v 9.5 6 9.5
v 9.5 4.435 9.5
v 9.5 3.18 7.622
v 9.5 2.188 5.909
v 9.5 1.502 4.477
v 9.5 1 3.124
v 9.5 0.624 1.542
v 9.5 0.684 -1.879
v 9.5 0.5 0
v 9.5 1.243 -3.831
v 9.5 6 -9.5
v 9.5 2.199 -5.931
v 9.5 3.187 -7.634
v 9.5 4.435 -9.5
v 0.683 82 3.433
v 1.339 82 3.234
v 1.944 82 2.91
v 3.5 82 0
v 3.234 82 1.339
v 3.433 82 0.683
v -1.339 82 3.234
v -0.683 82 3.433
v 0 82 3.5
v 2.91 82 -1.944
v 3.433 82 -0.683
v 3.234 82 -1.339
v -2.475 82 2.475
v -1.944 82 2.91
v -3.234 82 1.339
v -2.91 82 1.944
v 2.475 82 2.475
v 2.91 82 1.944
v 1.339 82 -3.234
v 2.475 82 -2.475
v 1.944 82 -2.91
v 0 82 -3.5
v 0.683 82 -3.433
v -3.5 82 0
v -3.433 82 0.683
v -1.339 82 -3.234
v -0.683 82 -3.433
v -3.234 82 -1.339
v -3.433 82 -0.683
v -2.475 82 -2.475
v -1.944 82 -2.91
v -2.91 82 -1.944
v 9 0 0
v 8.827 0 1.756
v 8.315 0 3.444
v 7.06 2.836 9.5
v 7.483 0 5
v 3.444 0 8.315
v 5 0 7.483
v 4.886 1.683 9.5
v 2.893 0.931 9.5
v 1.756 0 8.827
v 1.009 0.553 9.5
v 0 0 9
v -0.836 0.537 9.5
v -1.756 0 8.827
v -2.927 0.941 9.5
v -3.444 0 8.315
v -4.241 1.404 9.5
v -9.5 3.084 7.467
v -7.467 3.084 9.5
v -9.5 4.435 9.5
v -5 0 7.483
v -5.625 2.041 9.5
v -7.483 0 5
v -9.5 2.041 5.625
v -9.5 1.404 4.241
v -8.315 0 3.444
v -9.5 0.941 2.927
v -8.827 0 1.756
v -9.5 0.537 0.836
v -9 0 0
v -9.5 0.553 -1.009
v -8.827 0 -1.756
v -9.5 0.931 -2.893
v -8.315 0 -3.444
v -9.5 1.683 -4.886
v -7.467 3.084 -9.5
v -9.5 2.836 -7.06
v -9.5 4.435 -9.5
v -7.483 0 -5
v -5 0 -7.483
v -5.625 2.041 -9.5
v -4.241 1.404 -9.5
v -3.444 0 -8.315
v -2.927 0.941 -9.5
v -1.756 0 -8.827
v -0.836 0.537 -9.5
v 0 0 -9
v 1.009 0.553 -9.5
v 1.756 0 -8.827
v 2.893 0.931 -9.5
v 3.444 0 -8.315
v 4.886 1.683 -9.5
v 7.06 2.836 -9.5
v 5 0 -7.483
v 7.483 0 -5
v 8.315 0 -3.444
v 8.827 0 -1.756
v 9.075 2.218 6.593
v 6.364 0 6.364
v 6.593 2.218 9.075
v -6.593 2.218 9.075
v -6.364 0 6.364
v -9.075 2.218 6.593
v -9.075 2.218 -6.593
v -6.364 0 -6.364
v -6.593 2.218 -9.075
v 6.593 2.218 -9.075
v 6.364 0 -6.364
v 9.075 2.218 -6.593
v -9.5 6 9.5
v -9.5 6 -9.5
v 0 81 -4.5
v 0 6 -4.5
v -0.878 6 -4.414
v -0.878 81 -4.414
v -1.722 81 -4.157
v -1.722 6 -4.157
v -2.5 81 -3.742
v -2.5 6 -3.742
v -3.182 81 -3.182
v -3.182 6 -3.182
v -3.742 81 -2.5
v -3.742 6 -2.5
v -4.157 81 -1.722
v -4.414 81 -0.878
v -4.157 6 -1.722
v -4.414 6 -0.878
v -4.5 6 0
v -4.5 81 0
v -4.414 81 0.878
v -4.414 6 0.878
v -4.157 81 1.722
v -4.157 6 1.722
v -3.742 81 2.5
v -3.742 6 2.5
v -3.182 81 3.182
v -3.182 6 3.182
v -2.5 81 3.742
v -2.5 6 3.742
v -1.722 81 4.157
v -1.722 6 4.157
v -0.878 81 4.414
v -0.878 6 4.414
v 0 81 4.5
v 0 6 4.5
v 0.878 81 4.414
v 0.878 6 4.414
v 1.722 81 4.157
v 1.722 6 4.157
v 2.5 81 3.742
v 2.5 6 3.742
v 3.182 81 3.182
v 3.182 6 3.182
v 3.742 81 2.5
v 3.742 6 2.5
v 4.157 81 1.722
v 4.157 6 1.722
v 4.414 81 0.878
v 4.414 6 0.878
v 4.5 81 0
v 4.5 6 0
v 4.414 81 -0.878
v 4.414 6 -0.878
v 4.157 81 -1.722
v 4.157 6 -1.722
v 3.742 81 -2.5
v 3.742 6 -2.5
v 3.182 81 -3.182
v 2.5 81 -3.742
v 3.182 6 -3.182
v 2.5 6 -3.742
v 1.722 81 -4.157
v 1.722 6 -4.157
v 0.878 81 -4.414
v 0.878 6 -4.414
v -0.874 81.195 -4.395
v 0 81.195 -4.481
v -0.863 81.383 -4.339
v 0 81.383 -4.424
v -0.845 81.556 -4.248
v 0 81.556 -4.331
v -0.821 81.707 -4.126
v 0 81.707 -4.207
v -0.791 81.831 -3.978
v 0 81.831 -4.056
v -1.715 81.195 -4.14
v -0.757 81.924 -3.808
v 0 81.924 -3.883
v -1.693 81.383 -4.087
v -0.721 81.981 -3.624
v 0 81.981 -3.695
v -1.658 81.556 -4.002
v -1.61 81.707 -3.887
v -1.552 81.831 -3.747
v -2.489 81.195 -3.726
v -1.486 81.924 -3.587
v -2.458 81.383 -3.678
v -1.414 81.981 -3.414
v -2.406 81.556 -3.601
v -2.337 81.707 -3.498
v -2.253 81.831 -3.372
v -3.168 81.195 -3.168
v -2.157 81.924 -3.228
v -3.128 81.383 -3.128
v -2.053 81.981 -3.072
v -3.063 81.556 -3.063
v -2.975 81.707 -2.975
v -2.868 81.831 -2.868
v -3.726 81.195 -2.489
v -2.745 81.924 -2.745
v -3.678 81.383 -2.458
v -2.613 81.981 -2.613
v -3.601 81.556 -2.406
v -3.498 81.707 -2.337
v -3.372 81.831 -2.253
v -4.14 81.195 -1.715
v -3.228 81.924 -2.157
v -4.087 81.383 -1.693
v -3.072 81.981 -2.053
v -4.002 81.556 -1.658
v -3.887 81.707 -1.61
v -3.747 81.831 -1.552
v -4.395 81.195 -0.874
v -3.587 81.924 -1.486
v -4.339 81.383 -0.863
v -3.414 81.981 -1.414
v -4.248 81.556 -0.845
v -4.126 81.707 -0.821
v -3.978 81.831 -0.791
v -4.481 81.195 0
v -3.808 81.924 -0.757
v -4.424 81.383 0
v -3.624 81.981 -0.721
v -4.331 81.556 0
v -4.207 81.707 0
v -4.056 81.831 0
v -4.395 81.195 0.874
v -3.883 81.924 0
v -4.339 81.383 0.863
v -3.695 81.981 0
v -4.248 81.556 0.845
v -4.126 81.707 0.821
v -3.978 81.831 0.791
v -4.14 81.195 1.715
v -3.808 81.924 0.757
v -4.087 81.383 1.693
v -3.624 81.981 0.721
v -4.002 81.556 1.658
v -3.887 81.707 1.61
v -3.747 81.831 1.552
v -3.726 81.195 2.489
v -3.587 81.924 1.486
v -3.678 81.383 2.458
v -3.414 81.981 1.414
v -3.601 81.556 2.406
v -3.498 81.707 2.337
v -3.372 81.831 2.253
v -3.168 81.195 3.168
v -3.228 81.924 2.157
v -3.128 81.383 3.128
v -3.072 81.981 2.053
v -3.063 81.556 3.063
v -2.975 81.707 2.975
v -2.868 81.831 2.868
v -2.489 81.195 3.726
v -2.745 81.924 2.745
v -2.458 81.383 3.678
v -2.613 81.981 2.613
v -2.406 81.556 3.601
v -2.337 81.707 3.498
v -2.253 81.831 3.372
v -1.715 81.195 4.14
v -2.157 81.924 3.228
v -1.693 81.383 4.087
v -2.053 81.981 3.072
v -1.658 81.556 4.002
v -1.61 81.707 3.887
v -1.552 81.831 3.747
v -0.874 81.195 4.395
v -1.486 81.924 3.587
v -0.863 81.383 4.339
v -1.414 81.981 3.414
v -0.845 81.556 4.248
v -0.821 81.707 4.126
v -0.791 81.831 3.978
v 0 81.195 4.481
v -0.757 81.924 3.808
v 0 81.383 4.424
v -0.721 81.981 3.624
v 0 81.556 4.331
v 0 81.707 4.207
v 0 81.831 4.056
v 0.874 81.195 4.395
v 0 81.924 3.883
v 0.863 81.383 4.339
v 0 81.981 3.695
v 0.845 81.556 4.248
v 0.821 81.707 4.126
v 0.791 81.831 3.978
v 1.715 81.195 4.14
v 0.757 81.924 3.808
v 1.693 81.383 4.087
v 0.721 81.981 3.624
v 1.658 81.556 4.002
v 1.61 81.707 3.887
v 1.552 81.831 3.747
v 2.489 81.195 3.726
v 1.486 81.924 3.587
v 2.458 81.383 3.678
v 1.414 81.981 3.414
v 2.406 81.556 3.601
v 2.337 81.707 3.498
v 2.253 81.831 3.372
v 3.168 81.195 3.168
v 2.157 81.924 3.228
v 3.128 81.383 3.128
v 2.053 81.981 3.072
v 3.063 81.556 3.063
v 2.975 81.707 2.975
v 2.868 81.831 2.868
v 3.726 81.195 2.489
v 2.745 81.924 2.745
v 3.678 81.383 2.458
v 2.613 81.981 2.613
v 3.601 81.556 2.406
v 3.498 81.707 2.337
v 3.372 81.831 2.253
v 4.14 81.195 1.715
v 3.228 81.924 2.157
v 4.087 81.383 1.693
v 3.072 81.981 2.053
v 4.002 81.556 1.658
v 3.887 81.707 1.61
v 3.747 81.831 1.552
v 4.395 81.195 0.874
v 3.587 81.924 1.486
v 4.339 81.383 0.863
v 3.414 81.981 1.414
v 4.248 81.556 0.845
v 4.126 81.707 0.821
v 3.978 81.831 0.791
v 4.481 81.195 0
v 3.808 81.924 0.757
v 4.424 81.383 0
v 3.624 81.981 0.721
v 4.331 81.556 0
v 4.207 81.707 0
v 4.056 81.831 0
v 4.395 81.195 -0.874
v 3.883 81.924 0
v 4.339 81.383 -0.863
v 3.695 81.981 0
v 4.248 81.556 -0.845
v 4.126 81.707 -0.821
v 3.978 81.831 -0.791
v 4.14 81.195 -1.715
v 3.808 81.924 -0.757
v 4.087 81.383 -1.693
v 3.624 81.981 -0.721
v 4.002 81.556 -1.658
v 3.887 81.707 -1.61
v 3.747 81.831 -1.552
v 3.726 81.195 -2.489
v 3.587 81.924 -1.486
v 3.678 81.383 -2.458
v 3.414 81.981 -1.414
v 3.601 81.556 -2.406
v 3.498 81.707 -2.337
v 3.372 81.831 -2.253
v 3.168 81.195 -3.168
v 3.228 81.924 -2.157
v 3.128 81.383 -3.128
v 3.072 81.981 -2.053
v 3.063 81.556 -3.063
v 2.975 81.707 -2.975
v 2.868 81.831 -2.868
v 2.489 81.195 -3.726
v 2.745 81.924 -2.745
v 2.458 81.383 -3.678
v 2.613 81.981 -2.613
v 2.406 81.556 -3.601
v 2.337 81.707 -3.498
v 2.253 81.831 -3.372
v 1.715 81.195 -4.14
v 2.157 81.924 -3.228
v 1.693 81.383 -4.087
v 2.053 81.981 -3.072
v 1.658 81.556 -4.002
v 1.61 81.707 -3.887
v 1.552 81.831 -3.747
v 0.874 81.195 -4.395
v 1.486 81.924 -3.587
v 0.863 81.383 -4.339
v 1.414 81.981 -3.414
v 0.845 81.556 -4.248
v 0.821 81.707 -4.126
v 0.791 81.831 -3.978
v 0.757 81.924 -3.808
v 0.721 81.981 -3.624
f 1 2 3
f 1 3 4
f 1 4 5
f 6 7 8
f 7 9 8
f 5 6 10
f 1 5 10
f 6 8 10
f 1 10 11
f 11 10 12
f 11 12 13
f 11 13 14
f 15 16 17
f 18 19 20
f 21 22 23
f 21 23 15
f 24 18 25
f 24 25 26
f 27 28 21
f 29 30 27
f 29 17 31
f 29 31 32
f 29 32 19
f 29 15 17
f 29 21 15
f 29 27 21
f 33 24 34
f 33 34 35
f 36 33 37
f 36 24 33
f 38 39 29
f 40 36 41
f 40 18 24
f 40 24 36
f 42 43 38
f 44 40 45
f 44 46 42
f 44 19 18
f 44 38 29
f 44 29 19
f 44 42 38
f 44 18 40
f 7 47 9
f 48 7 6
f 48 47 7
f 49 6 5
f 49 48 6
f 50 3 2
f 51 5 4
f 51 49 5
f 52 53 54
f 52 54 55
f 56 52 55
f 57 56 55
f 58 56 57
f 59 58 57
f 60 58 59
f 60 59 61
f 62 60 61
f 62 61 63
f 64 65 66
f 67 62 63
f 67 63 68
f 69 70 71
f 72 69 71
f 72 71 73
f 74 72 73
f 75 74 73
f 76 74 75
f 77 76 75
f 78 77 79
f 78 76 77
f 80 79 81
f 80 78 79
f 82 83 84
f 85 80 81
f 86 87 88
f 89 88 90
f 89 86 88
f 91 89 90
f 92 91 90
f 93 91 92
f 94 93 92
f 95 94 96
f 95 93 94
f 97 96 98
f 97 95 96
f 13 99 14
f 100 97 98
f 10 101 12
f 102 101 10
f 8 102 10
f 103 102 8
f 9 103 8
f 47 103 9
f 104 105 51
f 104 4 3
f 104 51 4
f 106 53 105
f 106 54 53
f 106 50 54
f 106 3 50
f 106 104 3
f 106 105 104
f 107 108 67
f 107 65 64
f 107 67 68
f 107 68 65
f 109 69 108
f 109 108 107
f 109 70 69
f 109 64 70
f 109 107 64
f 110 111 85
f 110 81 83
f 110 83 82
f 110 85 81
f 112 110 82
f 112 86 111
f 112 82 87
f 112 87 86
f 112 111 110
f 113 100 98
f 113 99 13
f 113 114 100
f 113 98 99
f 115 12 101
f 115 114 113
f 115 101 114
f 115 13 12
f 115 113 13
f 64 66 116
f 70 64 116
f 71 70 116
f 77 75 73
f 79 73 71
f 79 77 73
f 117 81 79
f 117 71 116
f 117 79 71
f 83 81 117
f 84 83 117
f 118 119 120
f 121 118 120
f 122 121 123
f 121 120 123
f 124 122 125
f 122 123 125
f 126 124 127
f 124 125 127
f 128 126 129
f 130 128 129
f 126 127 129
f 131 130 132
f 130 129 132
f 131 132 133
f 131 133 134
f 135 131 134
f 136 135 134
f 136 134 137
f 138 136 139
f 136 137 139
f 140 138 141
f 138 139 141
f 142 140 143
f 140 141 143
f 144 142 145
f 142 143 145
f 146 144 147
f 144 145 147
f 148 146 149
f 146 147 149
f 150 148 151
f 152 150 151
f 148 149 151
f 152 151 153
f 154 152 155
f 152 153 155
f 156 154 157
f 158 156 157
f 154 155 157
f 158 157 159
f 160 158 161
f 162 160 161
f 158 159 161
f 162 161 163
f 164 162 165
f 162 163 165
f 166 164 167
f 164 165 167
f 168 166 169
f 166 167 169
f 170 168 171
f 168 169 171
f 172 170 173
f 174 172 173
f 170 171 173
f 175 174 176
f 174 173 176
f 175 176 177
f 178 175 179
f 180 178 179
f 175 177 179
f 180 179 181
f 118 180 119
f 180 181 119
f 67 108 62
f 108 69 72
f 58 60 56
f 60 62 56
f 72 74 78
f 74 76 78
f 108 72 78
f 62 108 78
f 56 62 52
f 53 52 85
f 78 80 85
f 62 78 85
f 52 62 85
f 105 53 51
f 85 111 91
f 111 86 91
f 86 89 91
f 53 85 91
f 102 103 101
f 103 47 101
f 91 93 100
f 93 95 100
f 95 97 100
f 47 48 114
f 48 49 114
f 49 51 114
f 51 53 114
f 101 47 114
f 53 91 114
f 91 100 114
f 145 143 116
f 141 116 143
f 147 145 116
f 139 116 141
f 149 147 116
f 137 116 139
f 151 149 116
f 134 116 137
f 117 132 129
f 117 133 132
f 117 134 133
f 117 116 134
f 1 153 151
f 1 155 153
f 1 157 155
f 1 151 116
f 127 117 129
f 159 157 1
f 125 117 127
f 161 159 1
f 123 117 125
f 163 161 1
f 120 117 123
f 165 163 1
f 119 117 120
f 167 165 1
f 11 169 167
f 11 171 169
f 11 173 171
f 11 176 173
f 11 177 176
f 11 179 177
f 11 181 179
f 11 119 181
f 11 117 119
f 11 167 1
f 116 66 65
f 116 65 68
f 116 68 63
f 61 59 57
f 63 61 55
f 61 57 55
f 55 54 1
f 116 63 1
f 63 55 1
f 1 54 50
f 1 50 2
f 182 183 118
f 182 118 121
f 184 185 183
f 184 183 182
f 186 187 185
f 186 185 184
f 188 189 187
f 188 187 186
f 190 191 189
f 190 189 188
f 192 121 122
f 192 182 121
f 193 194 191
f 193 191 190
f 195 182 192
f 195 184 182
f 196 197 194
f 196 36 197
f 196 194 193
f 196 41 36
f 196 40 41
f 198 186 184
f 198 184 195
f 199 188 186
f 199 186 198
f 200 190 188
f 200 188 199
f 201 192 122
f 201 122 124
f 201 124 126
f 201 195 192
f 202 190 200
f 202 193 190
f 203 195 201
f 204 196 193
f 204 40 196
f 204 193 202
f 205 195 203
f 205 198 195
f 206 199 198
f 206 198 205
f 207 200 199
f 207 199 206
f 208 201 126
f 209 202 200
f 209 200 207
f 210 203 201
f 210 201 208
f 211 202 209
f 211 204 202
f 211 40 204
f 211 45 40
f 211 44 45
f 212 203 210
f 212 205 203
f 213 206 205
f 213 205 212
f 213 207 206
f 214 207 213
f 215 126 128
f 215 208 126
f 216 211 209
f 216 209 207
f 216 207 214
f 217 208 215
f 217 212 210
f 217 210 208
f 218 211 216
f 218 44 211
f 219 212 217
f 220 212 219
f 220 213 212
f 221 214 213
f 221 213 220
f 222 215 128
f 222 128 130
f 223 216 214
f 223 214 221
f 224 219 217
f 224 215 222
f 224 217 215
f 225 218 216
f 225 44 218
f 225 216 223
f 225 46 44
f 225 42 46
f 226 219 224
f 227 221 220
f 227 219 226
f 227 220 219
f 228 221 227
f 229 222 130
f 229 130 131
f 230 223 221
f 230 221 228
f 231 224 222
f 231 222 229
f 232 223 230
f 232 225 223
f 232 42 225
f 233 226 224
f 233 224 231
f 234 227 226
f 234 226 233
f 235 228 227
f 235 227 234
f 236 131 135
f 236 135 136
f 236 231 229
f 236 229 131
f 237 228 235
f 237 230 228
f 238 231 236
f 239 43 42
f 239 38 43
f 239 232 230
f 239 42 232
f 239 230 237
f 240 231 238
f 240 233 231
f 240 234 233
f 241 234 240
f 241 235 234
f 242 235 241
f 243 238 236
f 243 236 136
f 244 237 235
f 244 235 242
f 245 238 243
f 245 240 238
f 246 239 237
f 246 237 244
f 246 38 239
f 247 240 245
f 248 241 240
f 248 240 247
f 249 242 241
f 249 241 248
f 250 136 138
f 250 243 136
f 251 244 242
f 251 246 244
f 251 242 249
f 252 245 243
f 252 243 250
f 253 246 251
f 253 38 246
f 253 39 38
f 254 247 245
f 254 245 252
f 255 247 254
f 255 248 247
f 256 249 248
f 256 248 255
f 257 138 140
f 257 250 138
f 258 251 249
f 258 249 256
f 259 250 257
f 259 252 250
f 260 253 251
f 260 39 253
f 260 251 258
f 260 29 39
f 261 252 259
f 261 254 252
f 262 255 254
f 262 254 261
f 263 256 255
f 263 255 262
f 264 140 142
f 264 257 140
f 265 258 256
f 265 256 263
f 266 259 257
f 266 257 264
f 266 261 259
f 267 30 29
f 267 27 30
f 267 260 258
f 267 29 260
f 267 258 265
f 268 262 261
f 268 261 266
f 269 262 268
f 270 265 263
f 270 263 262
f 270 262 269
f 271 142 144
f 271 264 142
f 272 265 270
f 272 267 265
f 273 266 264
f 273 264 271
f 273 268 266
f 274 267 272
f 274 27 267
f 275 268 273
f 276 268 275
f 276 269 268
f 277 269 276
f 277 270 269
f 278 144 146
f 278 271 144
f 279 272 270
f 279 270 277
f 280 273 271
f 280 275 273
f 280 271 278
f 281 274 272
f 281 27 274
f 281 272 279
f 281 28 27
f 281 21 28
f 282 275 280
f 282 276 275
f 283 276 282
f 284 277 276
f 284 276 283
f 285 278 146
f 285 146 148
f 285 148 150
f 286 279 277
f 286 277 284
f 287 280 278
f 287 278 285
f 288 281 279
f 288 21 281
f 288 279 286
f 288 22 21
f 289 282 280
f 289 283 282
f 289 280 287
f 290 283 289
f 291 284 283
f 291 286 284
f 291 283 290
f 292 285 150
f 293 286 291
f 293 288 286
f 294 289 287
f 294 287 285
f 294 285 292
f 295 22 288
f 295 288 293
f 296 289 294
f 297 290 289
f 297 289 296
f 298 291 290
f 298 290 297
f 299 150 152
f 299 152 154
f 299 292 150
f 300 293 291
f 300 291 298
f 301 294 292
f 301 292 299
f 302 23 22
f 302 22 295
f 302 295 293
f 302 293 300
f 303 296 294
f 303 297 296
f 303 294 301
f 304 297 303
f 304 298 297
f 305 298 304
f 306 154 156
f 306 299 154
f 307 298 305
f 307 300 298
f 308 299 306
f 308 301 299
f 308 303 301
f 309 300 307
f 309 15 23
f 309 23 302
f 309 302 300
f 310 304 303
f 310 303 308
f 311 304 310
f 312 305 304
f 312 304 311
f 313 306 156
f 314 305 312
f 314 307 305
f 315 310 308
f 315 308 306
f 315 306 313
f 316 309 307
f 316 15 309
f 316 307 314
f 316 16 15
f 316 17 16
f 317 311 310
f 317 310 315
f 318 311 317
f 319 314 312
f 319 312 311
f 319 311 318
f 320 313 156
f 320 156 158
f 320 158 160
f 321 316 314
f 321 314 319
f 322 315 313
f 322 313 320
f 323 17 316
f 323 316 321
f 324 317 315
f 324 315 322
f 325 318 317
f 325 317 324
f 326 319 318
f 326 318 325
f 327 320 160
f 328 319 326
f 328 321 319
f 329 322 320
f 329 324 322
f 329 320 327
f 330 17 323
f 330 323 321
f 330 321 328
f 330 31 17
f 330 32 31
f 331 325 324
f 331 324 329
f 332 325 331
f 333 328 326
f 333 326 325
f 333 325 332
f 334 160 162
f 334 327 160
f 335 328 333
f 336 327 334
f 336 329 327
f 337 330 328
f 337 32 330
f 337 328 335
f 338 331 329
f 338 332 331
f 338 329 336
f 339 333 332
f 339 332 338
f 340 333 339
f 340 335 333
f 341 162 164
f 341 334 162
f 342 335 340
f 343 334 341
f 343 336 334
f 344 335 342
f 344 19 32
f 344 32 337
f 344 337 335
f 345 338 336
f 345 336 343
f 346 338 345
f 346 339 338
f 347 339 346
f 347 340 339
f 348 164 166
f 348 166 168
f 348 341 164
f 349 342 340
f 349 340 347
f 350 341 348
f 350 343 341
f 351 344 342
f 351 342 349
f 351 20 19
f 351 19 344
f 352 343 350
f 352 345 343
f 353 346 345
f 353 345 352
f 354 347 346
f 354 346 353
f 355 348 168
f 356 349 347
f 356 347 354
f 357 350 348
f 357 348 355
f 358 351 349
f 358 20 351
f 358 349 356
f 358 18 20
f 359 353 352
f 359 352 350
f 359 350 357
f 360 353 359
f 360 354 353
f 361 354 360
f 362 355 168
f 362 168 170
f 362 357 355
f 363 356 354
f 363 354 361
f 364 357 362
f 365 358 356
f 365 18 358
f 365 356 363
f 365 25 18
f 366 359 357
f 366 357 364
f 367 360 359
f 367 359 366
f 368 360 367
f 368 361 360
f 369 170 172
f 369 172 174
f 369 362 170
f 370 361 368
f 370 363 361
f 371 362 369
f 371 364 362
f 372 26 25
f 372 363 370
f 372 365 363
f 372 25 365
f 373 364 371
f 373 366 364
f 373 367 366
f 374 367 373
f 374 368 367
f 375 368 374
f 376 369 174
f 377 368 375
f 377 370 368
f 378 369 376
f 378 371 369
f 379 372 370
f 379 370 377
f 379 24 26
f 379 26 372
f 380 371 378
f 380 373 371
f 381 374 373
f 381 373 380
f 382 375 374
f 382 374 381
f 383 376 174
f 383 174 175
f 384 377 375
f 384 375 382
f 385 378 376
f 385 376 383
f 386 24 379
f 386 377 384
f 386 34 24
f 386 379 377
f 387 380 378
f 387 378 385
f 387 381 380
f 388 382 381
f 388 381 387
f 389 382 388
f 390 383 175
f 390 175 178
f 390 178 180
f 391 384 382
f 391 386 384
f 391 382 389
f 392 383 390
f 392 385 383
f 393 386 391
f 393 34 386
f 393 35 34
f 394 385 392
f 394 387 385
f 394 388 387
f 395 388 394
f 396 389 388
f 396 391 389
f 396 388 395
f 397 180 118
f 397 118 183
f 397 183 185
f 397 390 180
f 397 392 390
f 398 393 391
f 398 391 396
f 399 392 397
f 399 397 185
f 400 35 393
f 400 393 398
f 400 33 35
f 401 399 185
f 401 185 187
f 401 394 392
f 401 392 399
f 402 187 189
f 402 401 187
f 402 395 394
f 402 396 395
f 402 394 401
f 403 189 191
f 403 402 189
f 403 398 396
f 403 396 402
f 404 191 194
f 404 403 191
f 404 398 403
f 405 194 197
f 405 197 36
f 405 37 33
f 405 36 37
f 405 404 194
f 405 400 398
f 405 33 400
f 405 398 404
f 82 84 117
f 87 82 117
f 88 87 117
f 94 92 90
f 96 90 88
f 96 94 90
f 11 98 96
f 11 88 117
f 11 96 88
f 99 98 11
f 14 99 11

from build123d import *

# Parameters (mm, degrees)
SKETCH1_W           = 19
SKETCH1_H           = 19
BOSS_EXTRUDE1_DEPTH = 6
SKETCH2_R           = 4.5
BOSS_EXTRUDE2_DEPTH = 76
SKETCH3_OUTSIDE_W   = 190.258
SKETCH3_OUTSIDE_H   = 190.258
SKETCH3_OUTSIDE_R   = 9
CUT_EXTRUDE1_DEPTH  = 76
CUT_EXTRUDE1_DRAFT  = -45
FILLET1_R           = 1


with BuildPart() as part:
    # Sketch1 → Boss-Extrude1 (new body)
    with BuildSketch(Plane(origin=(0, 0, 0), x_dir=(1, 0, 0), z_dir=(0, 1, 0))):
        Rectangle(SKETCH1_W, SKETCH1_H)
    extrude(amount=BOSS_EXTRUDE1_DEPTH)

    # Sketch2 → Boss-Extrude2 (add)
    with BuildSketch(Plane(origin=(0, 6, 0), x_dir=(1, 0, 0), z_dir=(0, 1, 0))):
        with Locations(Location((0, 0, 0), (0, 0, 90))):  # turned: the seam where the file's is
            Circle(SKETCH2_R)
    extrude(amount=BOSS_EXTRUDE2_DEPTH)


with BuildPart() as cut_extrude1_tool:
    # Sketch3 outside → Cut-Extrude1 (with draft: the straight prism first)
    with BuildSketch(Plane.XZ):
        Rectangle(SKETCH3_OUTSIDE_W, SKETCH3_OUTSIDE_H)
        Circle(SKETCH3_OUTSIDE_R, mode=Mode.SUBTRACT)
    extrude(amount=-CUT_EXTRUDE1_DEPTH)
    # Cut-Extrude1: the draft: its side faces are tilted about the plane it starts from
    cut_extrude1_sides = [cut_extrude1_tool.faces().sort_by_distance(p)[0] for p in [
        (0, 38, -95.129),
        (95.129, 38, 0),
        (0, 38, 95.129),
        (-95.129, 38, 0),
        (-9, 38, 0),
    ]]
    draft(cut_extrude1_sides, Plane.XZ, CUT_EXTRUDE1_DRAFT)


with BuildPart() as part_1:
    add(part.part)

    # Cut-Extrude1: cut by cut_extrude1_tool
    add(cut_extrude1_tool.part, mode=Mode.SUBTRACT)

    # Fillet1
    fillet1_edges = [part_1.edges().sort_by_distance(p)[0] for p in [
        (0, 82, 4.5),
    ]]
    fillet(fillet1_edges, radius=FILLET1_R)


solid = part_1.part
